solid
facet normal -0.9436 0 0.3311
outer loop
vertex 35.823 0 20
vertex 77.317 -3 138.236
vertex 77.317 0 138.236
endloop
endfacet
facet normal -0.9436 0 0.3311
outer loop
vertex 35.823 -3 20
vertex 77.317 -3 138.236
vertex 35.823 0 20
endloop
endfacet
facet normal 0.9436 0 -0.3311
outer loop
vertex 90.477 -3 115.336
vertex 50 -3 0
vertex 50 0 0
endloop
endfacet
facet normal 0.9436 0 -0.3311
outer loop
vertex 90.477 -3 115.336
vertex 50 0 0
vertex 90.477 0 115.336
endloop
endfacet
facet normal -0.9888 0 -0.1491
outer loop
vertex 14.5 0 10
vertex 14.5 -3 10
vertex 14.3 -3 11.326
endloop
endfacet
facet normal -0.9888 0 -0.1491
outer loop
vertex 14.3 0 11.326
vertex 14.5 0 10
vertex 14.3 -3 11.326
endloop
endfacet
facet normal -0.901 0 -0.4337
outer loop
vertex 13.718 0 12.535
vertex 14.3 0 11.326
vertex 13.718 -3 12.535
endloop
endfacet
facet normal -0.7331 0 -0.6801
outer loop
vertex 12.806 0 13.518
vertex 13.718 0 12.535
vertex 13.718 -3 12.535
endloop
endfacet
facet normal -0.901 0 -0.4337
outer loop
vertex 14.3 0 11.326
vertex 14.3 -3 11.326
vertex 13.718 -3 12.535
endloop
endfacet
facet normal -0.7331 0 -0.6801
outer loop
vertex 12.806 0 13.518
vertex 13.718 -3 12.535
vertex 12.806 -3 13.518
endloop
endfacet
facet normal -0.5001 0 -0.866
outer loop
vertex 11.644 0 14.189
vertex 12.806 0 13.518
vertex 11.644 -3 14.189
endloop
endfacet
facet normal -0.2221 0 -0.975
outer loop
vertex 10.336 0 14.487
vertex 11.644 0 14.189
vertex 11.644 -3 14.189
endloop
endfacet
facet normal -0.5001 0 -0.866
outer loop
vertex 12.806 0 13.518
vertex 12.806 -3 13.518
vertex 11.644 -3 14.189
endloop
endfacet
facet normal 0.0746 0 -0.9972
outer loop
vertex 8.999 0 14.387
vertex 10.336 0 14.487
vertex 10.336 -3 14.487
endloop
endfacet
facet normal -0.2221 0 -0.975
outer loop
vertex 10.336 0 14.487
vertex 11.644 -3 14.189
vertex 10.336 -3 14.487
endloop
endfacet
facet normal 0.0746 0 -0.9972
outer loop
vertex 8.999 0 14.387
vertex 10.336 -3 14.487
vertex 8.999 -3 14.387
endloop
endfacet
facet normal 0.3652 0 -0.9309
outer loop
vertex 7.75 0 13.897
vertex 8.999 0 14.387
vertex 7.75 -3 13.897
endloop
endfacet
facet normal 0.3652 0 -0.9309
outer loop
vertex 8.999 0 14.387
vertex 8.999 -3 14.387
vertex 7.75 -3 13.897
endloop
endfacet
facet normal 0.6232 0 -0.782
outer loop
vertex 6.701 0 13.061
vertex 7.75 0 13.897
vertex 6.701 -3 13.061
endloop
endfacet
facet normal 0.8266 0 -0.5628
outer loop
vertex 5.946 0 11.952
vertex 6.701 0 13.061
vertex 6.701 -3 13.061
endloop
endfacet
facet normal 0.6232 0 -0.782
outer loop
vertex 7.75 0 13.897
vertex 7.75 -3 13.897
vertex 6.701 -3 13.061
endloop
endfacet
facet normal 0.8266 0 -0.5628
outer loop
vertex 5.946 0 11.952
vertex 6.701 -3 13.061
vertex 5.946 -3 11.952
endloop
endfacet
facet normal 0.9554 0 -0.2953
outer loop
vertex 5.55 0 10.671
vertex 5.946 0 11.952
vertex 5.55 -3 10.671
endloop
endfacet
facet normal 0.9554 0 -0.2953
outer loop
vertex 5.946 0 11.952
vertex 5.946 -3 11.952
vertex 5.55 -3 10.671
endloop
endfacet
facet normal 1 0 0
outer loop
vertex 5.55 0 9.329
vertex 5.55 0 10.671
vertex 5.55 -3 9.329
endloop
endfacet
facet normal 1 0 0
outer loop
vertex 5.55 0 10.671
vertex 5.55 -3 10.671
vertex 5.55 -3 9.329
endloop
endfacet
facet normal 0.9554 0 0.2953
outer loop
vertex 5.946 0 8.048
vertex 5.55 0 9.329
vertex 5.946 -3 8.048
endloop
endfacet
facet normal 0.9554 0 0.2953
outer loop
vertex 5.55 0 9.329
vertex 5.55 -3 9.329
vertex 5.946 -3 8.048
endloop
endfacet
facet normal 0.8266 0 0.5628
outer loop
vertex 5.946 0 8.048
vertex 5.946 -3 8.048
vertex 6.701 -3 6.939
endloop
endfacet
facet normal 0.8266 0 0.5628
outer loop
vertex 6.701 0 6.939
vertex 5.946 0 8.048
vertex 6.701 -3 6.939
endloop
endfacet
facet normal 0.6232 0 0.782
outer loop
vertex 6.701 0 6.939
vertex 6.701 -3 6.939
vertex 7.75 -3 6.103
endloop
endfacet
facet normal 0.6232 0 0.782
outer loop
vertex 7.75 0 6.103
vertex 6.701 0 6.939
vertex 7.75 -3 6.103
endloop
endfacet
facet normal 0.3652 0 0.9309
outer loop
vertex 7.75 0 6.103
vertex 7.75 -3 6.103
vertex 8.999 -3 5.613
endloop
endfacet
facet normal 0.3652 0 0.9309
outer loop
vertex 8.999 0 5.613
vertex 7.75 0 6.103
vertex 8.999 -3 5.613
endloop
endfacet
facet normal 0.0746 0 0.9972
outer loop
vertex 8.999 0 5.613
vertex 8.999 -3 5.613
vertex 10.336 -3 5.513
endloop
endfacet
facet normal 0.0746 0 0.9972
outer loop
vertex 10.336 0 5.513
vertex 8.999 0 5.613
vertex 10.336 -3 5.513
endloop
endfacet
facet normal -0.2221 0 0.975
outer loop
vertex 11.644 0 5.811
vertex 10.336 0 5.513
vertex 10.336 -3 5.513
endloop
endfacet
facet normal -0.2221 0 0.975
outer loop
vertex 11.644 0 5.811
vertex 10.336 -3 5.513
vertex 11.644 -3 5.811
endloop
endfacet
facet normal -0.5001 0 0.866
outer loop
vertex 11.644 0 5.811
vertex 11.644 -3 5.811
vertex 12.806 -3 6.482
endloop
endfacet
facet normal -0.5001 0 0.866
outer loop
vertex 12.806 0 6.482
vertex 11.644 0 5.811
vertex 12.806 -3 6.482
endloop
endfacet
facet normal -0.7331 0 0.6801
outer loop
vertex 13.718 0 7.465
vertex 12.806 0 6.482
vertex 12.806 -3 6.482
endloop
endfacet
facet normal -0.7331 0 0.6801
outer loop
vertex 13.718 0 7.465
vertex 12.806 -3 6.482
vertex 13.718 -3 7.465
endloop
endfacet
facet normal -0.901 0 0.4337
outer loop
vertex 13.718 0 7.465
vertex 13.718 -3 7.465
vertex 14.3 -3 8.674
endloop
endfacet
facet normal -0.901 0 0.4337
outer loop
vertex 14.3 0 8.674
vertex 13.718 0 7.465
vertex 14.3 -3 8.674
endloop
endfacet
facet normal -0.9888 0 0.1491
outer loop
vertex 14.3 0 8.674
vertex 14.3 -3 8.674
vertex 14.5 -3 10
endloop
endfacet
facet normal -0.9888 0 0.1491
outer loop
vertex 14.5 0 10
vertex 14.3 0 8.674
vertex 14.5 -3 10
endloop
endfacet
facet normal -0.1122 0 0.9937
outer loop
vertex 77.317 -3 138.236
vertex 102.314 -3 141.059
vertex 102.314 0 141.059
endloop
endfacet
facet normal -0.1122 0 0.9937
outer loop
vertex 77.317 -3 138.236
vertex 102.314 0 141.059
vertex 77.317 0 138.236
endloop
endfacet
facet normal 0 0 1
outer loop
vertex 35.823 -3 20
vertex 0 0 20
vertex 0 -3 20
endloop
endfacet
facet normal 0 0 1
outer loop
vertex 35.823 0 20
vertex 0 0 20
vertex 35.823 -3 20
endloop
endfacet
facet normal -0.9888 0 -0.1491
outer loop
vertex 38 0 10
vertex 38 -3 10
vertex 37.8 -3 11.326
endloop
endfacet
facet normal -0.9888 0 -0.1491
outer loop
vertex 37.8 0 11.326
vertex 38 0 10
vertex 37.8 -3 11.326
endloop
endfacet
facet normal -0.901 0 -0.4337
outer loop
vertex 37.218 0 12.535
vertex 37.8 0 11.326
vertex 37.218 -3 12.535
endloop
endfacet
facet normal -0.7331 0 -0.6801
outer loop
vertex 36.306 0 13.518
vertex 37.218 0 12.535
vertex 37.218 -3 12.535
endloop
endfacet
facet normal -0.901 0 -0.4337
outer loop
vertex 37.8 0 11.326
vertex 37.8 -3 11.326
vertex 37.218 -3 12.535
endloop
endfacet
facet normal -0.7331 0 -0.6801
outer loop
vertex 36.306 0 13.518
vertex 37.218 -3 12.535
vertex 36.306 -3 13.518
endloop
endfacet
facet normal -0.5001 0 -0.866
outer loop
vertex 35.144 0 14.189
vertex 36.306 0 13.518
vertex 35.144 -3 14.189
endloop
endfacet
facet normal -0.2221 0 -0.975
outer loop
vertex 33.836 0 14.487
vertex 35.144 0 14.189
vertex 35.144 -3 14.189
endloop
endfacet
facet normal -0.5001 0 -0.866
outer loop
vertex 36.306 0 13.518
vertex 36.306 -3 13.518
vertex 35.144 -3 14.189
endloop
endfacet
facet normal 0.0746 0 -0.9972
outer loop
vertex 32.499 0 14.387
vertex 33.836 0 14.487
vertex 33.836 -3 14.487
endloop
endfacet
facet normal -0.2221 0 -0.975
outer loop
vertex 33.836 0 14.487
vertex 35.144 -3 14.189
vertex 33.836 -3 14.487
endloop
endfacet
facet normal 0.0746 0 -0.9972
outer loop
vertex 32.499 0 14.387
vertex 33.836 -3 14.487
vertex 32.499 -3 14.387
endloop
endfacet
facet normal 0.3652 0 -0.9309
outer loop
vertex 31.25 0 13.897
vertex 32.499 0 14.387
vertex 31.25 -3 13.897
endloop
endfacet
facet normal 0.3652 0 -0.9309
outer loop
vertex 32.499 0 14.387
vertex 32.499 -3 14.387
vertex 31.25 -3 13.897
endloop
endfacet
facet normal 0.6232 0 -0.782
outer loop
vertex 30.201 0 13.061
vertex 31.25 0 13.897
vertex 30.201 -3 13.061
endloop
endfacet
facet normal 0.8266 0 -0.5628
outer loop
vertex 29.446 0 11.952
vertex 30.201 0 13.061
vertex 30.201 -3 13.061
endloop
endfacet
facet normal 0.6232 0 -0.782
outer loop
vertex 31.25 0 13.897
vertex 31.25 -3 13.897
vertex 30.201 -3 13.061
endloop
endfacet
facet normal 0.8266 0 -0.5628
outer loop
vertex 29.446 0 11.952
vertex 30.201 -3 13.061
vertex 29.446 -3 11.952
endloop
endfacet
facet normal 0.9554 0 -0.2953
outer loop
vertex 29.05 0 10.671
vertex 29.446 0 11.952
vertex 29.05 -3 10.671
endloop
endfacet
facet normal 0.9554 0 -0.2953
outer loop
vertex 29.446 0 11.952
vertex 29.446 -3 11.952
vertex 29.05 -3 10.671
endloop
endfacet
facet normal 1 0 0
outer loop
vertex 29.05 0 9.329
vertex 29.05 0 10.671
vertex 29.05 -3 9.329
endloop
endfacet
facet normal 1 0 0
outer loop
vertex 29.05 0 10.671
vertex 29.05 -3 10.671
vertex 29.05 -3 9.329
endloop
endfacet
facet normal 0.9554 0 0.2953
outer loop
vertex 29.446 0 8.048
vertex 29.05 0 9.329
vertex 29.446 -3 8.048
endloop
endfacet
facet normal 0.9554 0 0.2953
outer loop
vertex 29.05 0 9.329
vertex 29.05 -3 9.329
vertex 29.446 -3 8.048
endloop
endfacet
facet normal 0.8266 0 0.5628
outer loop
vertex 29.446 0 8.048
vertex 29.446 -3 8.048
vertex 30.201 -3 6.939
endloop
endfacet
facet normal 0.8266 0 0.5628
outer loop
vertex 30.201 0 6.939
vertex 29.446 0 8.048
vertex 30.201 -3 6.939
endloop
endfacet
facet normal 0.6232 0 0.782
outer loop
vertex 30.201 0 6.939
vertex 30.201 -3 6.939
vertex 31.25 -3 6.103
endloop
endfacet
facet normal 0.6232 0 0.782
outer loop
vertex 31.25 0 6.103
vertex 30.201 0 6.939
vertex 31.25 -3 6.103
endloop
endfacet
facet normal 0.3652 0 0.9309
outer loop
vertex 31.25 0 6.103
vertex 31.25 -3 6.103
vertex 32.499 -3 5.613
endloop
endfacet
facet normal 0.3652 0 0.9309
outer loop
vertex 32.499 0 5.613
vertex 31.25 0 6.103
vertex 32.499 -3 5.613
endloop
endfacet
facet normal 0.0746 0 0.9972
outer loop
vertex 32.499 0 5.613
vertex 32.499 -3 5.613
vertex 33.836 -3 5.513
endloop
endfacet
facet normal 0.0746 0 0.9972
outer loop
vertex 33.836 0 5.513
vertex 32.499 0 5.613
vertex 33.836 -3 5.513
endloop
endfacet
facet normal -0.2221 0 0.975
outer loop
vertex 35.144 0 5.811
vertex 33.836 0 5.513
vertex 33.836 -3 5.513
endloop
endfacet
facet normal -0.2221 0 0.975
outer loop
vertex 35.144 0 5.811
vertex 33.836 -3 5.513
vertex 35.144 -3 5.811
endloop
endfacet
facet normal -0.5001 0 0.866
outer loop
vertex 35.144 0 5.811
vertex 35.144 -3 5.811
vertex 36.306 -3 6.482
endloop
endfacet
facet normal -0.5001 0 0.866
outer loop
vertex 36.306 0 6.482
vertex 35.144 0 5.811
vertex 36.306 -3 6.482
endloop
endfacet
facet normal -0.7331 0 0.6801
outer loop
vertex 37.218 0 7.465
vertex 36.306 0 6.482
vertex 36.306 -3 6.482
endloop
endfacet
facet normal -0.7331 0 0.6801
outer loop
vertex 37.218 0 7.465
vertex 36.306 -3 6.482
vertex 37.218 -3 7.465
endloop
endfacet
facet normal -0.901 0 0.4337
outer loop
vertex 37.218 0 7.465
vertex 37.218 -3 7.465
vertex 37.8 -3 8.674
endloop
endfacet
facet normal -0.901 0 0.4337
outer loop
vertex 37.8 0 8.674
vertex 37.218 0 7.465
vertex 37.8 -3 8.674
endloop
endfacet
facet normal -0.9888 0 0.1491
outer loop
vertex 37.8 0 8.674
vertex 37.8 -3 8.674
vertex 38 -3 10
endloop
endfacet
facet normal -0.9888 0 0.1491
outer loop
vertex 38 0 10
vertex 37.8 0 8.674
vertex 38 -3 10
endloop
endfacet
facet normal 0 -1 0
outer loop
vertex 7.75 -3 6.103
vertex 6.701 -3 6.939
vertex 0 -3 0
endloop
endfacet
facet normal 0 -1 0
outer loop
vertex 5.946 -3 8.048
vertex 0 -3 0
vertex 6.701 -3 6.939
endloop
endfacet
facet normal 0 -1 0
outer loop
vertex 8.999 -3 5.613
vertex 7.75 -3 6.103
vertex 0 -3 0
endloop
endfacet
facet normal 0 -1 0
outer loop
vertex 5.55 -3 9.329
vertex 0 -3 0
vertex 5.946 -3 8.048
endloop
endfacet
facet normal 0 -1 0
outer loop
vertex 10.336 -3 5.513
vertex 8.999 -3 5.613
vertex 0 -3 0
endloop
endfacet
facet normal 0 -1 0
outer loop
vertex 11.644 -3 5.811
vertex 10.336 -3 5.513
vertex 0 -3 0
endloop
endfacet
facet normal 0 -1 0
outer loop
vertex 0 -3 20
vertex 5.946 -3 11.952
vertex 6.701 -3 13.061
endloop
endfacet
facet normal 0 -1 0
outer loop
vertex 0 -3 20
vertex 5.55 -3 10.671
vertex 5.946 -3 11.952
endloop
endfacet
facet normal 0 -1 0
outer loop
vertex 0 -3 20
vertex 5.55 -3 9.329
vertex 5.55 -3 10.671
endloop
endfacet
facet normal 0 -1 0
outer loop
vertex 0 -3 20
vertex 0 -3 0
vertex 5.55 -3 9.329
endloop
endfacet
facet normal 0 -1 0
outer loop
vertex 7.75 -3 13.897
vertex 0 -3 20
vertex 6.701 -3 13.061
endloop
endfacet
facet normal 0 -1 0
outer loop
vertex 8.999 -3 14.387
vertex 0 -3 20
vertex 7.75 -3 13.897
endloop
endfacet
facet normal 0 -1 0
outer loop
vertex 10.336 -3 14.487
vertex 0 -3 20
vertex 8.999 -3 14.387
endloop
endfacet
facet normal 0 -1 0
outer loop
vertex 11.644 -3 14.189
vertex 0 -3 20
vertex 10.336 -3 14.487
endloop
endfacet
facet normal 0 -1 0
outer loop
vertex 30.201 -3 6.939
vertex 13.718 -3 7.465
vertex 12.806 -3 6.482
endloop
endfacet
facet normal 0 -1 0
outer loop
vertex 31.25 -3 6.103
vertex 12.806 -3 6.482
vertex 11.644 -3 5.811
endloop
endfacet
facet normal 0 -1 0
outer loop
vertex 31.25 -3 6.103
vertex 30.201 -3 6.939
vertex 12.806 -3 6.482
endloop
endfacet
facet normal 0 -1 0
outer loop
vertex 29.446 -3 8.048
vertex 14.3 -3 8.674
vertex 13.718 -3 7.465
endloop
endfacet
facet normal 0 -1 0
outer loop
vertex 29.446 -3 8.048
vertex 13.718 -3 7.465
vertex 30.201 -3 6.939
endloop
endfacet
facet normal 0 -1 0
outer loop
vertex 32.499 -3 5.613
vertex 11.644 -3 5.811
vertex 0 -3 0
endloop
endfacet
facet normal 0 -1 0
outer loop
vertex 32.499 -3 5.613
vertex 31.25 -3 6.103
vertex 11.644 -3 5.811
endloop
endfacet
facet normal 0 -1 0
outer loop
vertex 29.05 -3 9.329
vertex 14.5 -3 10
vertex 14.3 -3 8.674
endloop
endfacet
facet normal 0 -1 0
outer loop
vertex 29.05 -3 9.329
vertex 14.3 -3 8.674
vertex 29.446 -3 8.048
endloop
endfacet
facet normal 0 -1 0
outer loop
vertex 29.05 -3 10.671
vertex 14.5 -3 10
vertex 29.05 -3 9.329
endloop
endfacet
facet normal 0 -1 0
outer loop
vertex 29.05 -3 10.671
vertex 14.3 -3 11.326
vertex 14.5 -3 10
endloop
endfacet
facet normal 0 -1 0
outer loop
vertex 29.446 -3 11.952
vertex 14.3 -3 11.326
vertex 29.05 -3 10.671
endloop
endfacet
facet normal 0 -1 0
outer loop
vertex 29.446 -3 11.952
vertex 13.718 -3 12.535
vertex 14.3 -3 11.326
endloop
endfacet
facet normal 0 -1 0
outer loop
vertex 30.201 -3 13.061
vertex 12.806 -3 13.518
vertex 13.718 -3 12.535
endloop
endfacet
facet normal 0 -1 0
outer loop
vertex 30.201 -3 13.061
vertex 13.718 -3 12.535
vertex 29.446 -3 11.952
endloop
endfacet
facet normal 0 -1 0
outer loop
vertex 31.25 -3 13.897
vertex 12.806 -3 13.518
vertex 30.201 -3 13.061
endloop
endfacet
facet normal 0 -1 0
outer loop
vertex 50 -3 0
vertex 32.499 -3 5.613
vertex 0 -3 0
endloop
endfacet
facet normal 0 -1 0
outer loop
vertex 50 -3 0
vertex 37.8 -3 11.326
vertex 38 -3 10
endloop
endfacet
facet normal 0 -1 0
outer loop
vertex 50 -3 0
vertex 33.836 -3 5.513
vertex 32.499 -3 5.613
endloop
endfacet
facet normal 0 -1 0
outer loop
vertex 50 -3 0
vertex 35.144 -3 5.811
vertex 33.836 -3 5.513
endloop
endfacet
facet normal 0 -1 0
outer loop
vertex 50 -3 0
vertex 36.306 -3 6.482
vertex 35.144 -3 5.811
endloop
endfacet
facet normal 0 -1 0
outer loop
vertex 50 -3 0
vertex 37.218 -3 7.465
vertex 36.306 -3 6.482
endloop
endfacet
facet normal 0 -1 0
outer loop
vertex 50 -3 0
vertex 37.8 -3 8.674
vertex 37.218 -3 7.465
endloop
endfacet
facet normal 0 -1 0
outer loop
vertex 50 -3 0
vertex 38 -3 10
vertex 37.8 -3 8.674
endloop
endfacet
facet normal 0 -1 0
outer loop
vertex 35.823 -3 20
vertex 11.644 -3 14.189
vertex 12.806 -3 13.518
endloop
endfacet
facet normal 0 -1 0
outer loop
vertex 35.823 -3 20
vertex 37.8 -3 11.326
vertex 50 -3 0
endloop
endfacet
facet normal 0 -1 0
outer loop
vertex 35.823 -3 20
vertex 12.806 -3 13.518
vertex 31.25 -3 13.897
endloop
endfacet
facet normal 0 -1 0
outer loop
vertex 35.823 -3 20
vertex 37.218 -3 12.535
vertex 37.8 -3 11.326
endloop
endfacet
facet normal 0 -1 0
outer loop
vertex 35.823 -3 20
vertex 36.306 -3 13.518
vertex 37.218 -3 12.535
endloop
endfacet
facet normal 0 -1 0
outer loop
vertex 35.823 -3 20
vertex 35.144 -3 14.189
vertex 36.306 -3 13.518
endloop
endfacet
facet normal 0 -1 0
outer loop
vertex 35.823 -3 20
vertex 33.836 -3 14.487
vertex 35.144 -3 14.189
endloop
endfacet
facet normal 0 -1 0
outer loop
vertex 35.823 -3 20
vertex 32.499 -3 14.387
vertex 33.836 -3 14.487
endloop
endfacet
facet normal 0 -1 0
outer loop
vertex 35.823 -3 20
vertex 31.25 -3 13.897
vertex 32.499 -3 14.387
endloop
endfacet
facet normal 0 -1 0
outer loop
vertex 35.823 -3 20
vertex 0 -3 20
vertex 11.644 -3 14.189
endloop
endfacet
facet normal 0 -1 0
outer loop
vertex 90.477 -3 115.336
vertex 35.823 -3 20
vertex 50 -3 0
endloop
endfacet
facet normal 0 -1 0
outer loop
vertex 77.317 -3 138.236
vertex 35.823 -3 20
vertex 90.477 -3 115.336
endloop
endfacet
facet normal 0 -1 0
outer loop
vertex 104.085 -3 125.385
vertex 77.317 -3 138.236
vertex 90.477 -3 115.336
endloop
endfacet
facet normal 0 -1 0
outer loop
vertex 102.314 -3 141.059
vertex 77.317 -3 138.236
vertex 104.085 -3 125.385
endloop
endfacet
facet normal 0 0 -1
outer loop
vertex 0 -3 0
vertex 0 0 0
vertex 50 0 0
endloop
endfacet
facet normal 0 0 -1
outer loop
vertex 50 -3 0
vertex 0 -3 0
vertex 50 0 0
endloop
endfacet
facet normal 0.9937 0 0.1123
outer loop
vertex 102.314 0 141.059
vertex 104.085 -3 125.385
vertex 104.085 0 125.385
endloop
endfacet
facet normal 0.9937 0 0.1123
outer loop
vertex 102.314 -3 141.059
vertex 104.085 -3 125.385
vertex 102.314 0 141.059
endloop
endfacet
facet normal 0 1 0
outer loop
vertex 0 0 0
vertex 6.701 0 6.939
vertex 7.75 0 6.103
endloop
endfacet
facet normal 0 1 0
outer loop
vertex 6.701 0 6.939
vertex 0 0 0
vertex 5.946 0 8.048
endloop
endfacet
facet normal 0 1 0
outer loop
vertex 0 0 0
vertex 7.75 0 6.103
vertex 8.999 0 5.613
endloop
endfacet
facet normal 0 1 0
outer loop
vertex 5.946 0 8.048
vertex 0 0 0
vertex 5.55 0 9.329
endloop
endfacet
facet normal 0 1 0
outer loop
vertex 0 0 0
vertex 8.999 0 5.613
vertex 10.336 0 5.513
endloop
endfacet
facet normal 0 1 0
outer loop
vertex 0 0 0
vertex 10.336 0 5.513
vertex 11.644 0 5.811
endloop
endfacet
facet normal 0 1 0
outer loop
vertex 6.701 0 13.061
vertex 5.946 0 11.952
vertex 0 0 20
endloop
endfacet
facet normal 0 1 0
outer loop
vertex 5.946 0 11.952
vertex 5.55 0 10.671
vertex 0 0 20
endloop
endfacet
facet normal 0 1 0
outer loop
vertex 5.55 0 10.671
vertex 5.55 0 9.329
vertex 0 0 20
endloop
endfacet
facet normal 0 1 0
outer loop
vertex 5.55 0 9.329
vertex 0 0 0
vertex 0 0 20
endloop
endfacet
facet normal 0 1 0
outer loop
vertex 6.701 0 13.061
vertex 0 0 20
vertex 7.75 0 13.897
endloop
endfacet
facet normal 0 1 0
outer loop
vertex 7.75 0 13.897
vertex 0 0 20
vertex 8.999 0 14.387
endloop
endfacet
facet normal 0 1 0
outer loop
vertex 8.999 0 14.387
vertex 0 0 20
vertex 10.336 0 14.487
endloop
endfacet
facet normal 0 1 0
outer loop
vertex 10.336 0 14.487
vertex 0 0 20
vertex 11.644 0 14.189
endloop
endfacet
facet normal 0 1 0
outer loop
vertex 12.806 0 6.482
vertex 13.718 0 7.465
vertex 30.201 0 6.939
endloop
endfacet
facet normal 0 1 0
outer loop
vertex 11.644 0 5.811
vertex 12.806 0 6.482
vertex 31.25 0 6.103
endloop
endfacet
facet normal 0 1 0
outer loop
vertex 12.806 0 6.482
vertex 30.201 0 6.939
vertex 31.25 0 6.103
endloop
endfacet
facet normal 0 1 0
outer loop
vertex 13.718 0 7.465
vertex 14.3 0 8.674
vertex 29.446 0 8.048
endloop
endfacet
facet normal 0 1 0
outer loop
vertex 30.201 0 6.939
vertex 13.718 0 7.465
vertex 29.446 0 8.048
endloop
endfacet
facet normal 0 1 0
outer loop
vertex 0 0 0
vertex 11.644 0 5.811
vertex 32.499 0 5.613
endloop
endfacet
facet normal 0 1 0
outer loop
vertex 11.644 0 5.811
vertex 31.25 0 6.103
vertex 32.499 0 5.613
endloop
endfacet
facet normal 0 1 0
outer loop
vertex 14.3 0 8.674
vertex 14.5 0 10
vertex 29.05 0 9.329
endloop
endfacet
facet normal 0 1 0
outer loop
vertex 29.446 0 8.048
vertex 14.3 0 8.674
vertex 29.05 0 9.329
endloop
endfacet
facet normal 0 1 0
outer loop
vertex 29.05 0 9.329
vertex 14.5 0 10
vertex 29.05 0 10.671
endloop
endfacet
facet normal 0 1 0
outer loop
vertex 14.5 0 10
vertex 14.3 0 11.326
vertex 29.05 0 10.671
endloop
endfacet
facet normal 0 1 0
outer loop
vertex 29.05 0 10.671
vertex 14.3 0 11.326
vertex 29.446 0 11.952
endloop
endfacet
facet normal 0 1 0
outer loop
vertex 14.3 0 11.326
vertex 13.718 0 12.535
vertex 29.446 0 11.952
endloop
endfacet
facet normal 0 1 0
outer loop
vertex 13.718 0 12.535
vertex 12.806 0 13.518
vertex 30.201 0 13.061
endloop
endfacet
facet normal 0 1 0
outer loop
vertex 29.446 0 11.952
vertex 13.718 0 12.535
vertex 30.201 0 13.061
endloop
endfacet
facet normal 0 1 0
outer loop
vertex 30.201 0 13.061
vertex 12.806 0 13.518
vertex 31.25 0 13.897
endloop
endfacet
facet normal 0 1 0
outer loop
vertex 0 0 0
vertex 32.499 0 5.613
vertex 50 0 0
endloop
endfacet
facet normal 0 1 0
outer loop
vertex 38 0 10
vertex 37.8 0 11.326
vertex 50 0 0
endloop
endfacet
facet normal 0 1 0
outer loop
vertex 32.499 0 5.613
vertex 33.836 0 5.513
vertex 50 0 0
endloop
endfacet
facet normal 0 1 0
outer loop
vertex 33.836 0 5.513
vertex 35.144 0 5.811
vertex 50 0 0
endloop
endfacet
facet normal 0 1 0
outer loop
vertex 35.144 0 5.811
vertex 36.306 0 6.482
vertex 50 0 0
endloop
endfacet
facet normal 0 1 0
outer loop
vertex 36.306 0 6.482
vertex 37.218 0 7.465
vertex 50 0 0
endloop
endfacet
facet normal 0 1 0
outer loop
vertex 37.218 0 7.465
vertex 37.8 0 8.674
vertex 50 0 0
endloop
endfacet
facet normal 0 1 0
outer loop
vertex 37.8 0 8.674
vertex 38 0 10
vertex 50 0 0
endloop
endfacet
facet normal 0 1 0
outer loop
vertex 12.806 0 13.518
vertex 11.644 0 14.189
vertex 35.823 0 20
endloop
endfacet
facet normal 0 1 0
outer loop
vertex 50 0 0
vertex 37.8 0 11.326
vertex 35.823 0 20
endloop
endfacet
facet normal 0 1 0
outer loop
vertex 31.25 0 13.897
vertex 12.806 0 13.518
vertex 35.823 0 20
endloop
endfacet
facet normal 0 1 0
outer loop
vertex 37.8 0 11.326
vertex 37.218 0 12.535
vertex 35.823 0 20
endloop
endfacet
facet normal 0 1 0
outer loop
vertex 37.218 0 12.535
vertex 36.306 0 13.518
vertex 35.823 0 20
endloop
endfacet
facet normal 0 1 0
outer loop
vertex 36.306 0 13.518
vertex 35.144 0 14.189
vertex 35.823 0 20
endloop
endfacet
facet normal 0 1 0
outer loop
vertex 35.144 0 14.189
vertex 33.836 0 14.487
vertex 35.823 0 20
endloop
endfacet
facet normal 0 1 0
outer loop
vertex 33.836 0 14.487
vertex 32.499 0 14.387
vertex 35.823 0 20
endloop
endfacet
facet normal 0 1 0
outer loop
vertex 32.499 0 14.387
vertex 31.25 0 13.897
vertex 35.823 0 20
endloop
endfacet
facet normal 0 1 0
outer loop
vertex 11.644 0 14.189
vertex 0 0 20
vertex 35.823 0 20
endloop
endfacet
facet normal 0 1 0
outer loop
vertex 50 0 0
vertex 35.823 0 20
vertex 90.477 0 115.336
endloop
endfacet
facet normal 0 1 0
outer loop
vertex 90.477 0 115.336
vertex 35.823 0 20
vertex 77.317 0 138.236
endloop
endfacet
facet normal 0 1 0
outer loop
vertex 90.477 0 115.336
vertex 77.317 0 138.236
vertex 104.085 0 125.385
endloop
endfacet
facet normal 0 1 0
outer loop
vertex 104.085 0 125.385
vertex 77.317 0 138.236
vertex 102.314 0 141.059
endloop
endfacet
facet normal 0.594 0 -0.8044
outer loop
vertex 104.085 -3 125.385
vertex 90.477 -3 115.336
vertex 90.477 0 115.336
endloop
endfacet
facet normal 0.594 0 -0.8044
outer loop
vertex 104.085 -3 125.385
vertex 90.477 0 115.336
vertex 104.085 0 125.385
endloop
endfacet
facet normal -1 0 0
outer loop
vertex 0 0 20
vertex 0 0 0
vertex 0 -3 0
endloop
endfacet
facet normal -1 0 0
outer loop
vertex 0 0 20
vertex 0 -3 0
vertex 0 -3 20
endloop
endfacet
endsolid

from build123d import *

# Parameters (mm, degrees)
F0_W     = 50
F0_H     = 20
F1_DEPTH = 3
F2_R     = 4.5
F3_DEPTH = 3.001
F5_DEPTH = 3


with BuildPart() as f1:
    # F0 (on Front) → F1 (new body)
    with BuildSketch(Plane.XZ):
        with Locations((25, 10)):
            Rectangle(F0_W, F0_H)
    extrude(amount=F1_DEPTH)

    # F2 (on face) → F3 (cut, through all)
    with BuildSketch(Plane.XZ.offset(3)):
        with Locations((10, 10)):
            Circle(F2_R)
        with Locations((33.5, 10)):
            Circle(F2_R)
    extrude(amount=-F3_DEPTH, mode=Mode.SUBTRACT)

    # F4 (on face) → F5 (join, through all)
    with BuildSketch(Plane.XZ.offset(3)):
        Polygon((50, 20), (50, 0), (90.476949, 115.33643), (104.084845, 125.385415), (102.314374, 141.059241), (77.317478, 138.235662), (35.823053, 20), align=None)
    extrude(amount=-F5_DEPTH)


solid = f1.part
